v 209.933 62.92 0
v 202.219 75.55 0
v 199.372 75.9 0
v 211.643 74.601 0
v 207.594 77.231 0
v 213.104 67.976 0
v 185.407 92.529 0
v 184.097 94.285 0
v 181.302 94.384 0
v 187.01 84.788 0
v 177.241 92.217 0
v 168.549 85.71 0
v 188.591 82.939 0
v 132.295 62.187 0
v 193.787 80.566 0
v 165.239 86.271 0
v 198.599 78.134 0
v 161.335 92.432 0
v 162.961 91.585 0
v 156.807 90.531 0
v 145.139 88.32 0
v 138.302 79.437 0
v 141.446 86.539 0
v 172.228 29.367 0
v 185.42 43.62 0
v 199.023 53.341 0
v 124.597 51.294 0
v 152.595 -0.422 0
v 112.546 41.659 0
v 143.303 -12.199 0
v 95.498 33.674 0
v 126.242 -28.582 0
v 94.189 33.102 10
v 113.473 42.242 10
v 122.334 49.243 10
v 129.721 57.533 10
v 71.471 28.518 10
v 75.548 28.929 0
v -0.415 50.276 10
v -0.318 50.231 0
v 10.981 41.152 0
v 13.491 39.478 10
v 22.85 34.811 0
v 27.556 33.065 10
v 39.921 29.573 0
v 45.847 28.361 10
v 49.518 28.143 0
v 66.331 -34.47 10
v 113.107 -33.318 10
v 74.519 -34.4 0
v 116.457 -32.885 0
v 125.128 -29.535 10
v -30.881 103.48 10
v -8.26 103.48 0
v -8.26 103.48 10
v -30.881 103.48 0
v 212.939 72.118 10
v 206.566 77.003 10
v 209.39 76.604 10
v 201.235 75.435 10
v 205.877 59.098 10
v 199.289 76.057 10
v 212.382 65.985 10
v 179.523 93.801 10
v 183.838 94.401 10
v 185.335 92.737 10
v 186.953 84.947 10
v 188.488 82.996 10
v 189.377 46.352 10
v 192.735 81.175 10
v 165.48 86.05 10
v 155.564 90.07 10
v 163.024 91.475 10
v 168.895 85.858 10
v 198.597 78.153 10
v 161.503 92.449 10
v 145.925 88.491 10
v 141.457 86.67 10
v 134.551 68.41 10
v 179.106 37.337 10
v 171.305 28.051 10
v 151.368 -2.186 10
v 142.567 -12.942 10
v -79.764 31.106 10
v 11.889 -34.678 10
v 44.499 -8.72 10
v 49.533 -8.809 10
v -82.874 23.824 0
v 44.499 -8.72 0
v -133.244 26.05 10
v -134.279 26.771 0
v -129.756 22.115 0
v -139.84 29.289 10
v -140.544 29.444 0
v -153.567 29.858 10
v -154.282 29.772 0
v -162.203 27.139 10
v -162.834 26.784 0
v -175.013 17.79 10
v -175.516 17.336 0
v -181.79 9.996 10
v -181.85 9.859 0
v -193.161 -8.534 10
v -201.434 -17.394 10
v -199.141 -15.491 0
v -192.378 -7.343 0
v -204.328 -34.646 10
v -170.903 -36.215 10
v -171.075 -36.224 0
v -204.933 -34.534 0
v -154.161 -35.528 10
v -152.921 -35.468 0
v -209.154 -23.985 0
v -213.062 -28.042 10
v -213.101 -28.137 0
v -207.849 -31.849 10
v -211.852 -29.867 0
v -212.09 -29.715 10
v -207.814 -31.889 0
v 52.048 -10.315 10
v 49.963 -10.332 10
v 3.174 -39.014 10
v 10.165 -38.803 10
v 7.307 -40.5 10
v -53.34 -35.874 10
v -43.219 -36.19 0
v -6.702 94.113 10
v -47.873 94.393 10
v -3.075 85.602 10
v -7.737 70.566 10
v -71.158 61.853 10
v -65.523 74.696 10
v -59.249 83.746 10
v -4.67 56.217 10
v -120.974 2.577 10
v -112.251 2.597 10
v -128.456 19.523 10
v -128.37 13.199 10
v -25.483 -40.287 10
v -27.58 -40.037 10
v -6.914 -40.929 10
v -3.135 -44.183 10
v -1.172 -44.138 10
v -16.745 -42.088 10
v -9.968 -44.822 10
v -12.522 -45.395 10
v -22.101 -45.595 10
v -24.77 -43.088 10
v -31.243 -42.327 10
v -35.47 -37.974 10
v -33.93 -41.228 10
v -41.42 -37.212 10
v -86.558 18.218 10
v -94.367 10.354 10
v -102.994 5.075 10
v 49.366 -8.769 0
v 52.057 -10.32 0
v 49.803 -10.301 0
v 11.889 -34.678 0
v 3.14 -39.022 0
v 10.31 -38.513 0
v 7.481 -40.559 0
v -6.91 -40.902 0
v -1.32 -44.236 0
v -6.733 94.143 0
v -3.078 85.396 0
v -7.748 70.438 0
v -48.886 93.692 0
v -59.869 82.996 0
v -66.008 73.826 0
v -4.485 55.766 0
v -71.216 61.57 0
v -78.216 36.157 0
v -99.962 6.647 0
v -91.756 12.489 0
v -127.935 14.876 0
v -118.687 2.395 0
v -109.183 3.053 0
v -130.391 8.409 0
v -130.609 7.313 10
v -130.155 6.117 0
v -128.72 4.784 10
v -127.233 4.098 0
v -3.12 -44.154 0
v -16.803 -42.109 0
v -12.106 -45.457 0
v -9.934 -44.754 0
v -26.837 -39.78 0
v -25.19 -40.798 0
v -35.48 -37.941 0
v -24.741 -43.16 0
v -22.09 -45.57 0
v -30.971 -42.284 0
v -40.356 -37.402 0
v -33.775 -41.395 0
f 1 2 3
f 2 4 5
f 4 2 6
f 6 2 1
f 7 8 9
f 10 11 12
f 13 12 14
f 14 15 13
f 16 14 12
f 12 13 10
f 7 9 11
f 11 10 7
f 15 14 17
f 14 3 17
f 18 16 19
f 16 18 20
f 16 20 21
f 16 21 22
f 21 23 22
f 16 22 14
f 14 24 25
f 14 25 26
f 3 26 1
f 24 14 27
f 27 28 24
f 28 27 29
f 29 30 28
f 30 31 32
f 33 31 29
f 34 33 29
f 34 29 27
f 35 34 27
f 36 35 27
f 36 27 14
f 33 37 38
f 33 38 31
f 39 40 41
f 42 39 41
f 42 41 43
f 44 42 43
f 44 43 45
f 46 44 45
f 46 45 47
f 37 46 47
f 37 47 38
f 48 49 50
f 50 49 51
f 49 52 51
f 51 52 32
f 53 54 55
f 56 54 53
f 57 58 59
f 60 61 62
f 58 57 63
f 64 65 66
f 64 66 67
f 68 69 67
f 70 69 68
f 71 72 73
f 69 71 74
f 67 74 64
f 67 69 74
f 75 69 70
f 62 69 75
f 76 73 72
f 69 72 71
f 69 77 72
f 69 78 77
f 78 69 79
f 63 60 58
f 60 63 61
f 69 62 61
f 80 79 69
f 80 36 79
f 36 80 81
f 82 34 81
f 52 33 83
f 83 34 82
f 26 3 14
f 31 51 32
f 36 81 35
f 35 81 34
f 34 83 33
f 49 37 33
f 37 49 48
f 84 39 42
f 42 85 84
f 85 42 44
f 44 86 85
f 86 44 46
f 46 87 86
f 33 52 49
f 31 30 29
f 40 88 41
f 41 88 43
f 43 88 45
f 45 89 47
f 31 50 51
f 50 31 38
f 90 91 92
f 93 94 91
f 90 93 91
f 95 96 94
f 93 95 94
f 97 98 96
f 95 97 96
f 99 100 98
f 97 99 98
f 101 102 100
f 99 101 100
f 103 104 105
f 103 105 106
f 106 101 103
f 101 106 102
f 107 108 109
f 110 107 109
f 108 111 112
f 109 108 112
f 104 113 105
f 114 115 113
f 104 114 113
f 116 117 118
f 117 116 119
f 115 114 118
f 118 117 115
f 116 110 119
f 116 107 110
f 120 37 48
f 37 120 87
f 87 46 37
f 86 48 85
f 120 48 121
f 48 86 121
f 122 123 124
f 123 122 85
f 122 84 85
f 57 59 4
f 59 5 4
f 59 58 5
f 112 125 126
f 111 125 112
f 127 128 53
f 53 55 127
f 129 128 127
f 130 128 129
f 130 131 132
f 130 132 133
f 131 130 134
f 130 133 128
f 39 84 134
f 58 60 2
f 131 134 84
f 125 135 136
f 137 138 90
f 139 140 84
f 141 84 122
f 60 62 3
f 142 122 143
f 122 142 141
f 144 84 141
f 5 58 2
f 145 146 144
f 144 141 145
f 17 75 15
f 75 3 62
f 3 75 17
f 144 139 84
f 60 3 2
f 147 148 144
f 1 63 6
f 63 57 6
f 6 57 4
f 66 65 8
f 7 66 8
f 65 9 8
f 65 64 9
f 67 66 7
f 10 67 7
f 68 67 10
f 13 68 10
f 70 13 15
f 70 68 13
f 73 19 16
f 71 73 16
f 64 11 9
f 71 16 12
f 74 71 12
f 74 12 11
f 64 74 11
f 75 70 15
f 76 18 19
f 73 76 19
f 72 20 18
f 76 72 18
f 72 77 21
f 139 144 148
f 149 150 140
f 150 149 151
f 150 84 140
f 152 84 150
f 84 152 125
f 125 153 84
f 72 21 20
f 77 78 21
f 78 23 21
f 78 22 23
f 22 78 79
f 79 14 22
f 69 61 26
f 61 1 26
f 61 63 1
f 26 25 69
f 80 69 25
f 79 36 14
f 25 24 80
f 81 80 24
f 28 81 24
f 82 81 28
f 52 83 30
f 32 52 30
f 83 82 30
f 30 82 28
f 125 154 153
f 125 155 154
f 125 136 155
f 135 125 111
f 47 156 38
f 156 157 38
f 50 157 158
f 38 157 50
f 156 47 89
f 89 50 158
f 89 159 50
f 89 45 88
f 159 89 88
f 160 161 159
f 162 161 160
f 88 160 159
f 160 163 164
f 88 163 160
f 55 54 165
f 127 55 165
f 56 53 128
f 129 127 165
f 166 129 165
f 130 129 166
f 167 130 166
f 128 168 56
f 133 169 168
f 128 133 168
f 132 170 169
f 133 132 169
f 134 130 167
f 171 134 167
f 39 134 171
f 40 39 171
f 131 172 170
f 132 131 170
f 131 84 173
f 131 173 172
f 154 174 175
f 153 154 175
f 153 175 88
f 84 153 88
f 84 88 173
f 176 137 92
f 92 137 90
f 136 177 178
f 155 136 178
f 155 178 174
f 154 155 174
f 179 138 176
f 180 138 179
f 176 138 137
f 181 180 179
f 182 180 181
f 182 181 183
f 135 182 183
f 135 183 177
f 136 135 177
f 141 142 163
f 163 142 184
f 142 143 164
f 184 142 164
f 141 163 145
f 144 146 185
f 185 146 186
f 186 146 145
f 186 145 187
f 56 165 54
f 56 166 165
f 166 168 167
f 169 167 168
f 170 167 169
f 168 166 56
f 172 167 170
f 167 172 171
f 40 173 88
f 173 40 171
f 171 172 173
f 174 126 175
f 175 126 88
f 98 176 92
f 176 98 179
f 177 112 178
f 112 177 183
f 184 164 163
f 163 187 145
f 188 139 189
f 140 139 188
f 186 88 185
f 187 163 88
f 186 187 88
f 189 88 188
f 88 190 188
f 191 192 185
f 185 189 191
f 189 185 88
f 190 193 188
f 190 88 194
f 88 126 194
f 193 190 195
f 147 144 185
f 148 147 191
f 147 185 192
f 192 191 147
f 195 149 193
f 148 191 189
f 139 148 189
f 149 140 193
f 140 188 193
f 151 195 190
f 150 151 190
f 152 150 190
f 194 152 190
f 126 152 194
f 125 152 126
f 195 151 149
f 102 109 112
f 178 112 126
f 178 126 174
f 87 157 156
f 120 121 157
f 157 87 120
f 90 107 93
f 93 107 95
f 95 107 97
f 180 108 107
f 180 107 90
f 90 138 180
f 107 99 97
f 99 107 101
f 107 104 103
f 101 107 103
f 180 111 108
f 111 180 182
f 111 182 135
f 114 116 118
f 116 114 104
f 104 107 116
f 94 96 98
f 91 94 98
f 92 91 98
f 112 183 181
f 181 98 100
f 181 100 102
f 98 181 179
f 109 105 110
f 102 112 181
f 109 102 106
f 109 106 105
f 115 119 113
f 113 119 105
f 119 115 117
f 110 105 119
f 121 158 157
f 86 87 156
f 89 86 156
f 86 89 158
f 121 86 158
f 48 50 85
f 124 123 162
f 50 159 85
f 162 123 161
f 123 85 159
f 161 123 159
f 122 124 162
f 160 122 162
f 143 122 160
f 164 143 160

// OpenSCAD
module cliff_wave_L1(scale) {polyhedron(
 points=[[199.37167358398438,75.90013885498047,0],[202.21896362304688,75.55001068115234,0],[209.93312072753906,62.91959762573242,0],
[207.5940704345703,77.23053741455078,0],[211.64306640625,74.60130310058594,0],[202.21896362304688,75.55001068115234,0],
[213.1039581298828,67.97622680664062,0],[202.21896362304688,75.55001068115234,0],[211.64306640625,74.60130310058594,0],
[209.93312072753906,62.91959762573242,0],[202.21896362304688,75.55001068115234,0],[213.1039581298828,67.97622680664062,0],
[181.3023681640625,94.38363647460938,0],[184.09671020507812,94.28502655029297,0],[185.40660095214844,92.5289535522461,0],
[168.54913330078125,85.71012115478516,0],[177.24105834960938,92.21691131591797,0],[187.0101776123047,84.78828430175781,0],
[132.2948760986328,62.18728256225586,0],[168.54913330078125,85.71012115478516,0],[188.59071350097656,82.93917846679688,0],
[188.59071350097656,82.93917846679688,0],[193.78683471679688,80.5660629272461,0],[132.2948760986328,62.18728256225586,0],
[168.54913330078125,85.71012115478516,0],[132.2948760986328,62.18728256225586,0],[165.23886108398438,86.27050018310547,0],
[187.0101776123047,84.78828430175781,0],[188.59071350097656,82.93917846679688,0],[168.54913330078125,85.71012115478516,0],
[177.24105834960938,92.21691131591797,0],[181.3023681640625,94.38363647460938,0],[185.40660095214844,92.5289535522461,0],
[185.40660095214844,92.5289535522461,0],[187.0101776123047,84.78828430175781,0],[177.24105834960938,92.21691131591797,0],
[198.59877014160156,78.13407135009766,0],[132.2948760986328,62.18728256225586,0],[193.78683471679688,80.5660629272461,0],
[198.59877014160156,78.13407135009766,0],[199.37167358398438,75.90013885498047,0],[132.2948760986328,62.18728256225586,0],
[162.96141052246094,91.58535766601562,0],[165.23886108398438,86.27050018310547,0],[161.33468627929688,92.43206787109375,0],
[156.8072967529297,90.53131866455078,0],[161.33468627929688,92.43206787109375,0],[165.23886108398438,86.27050018310547,0],
[145.1394500732422,88.31961822509766,0],[156.8072967529297,90.53131866455078,0],[165.23886108398438,86.27050018310547,0],
[138.30226135253906,79.4373550415039,0],[145.1394500732422,88.31961822509766,0],[165.23886108398438,86.27050018310547,0],
[138.30226135253906,79.4373550415039,0],[141.44580078125,86.53934478759766,0],[145.1394500732422,88.31961822509766,0],
[132.2948760986328,62.18728256225586,0],[138.30226135253906,79.4373550415039,0],[165.23886108398438,86.27050018310547,0],
[185.42034912109375,43.62025833129883,0],[172.22792053222656,29.366931915283203,0],[132.2948760986328,62.18728256225586,0],
[199.02317810058594,53.34084701538086,0],[185.42034912109375,43.62025833129883,0],[132.2948760986328,62.18728256225586,0],
[209.93312072753906,62.91959762573242,0],[199.02317810058594,53.34084701538086,0],[199.37167358398438,75.90013885498047,0],
[124.59748077392578,51.29447555541992,0],[132.2948760986328,62.18728256225586,0],[172.22792053222656,29.366931915283203,0],
[172.22792053222656,29.366931915283203,0],[152.59469604492188,-0.42217034101486206,0],[124.59748077392578,51.29447555541992,0],
[112.54574584960938,41.65903854370117,0],[124.59748077392578,51.29447555541992,0],[152.59469604492188,-0.42217034101486206,0],
[152.59469604492188,-0.42217034101486206,0],[143.30255126953125,-12.19916820526123,0],[112.54574584960938,41.65903854370117,0],
[126.24242401123047,-28.581745147705078,0],[95.49767303466797,33.674278259277344,0],[143.30255126953125,-12.19916820526123,0],
[112.54574584960938,41.65903854370117,0],[95.49767303466797,33.674278259277344,0],[94.1887435913086,33.1020393371582,10],
[112.54574584960938,41.65903854370117,0],[94.1887435913086,33.1020393371582,10],[113.4732666015625,42.2421989440918,10],
[124.59748077392578,51.29447555541992,0],[112.54574584960938,41.65903854370117,0],[113.4732666015625,42.2421989440918,10],
[124.59748077392578,51.29447555541992,0],[113.4732666015625,42.2421989440918,10],[122.33402252197266,49.24305725097656,10],
[124.59748077392578,51.29447555541992,0],[122.33402252197266,49.24305725097656,10],[129.7212371826172,57.533226013183594,10],
[132.2948760986328,62.18728256225586,0],[124.59748077392578,51.29447555541992,0],[129.7212371826172,57.533226013183594,10],
[75.54798126220703,28.928678512573242,0],[71.4708480834961,28.517797470092773,10],[94.1887435913086,33.1020393371582,10],
[95.49767303466797,33.674278259277344,0],[75.54798126220703,28.928678512573242,0],[94.1887435913086,33.1020393371582,10],
[10.981195449829102,41.152252197265625,0],[-0.3182032108306885,50.23066329956055,0],[-0.4153667092323303,50.275516510009766,10],
[10.981195449829102,41.152252197265625,0],[-0.4153667092323303,50.275516510009766,10],[13.491422653198242,39.477725982666016,10],
[22.850000381469727,34.810760498046875,0],[10.981195449829102,41.152252197265625,0],[13.491422653198242,39.477725982666016,10],
[22.850000381469727,34.810760498046875,0],[13.491422653198242,39.477725982666016,10],[27.555904388427734,33.06477737426758,10],
[39.92094802856445,29.573442459106445,0],[22.850000381469727,34.810760498046875,0],[27.555904388427734,33.06477737426758,10],
[39.92094802856445,29.573442459106445,0],[27.555904388427734,33.06477737426758,10],[45.847076416015625,28.361417770385742,10],
[49.51791763305664,28.14299201965332,0],[39.92094802856445,29.573442459106445,0],[45.847076416015625,28.361417770385742,10],
[49.51791763305664,28.14299201965332,0],[45.847076416015625,28.361417770385742,10],[71.4708480834961,28.517797470092773,10],
[75.54798126220703,28.928678512573242,0],[49.51791763305664,28.14299201965332,0],[71.4708480834961,28.517797470092773,10],
[74.51927185058594,-34.40031051635742,0],[113.10662841796875,-33.31764221191406,10],[66.33106231689453,-34.47044372558594,10],
[116.45669555664062,-32.88462829589844,0],[113.10662841796875,-33.31764221191406,10],[74.51927185058594,-34.40031051635742,0],
[116.45669555664062,-32.88462829589844,0],[125.12801361083984,-29.535409927368164,10],[113.10662841796875,-33.31764221191406,10],
[126.24242401123047,-28.581745147705078,0],[125.12801361083984,-29.535409927368164,10],[116.45669555664062,-32.88462829589844,0],
[-8.260000228881836,103.4800033569336,10],[-8.260000228881836,103.4800033569336,0],[-30.881000518798828,103.4800033569336,10],
[-30.881000518798828,103.4800033569336,10],[-8.260000228881836,103.4800033569336,0],[-30.881000518798828,103.4800033569336,0],
[209.38973999023438,76.6042251586914,10],[206.56561279296875,77.00340270996094,10],[212.93914794921875,72.11756134033203,10],
[199.28900146484375,76.05670928955078,10],[205.87713623046875,59.09784698486328,10],[201.23477172851562,75.43526458740234,10],
[212.38209533691406,65.98548126220703,10],[212.93914794921875,72.11756134033203,10],[206.56561279296875,77.00340270996094,10],
[185.33534240722656,92.7367935180664,10],[183.83792114257812,94.40069580078125,10],[179.52325439453125,93.80120086669922,10],
[186.9530792236328,84.94690704345703,10],[185.33534240722656,92.7367935180664,10],[179.52325439453125,93.80120086669922,10],
[186.9530792236328,84.94690704345703,10],[189.37725830078125,46.35154342651367,10],[188.4876708984375,82.99583435058594,10],
[188.4876708984375,82.99583435058594,10],[189.37725830078125,46.35154342651367,10],[192.73458862304688,81.174560546875,10],
[163.02427673339844,91.47467803955078,10],[155.56365966796875,90.07017517089844,10],[165.48045349121094,86.05018615722656,10],
[168.8946533203125,85.85816955566406,10],[165.48045349121094,86.05018615722656,10],[189.37725830078125,46.35154342651367,10],
[179.52325439453125,93.80120086669922,10],[168.8946533203125,85.85816955566406,10],[186.9530792236328,84.94690704345703,10],
[168.8946533203125,85.85816955566406,10],[189.37725830078125,46.35154342651367,10],[186.9530792236328,84.94690704345703,10],
[192.73458862304688,81.174560546875,10],[189.37725830078125,46.35154342651367,10],[198.5966339111328,78.153076171875,10],
[198.5966339111328,78.153076171875,10],[189.37725830078125,46.35154342651367,10],[199.28900146484375,76.05670928955078,10],
[155.56365966796875,90.07017517089844,10],[163.02427673339844,91.47467803955078,10],[161.5028076171875,92.4485092163086,10],
[165.48045349121094,86.05018615722656,10],[155.56365966796875,90.07017517089844,10],[189.37725830078125,46.35154342651367,10],
[155.56365966796875,90.07017517089844,10],[145.92495727539062,88.49105072021484,10],[189.37725830078125,46.35154342651367,10],
[145.92495727539062,88.49105072021484,10],[141.45726013183594,86.66956329345703,10],[189.37725830078125,46.35154342651367,10],
[134.55137634277344,68.40991973876953,10],[189.37725830078125,46.35154342651367,10],[141.45726013183594,86.66956329345703,10],
[206.56561279296875,77.00340270996094,10],[201.23477172851562,75.43526458740234,10],[212.38209533691406,65.98548126220703,10],
[205.87713623046875,59.09784698486328,10],[212.38209533691406,65.98548126220703,10],[201.23477172851562,75.43526458740234,10],
[205.87713623046875,59.09784698486328,10],[199.28900146484375,76.05670928955078,10],[189.37725830078125,46.35154342651367,10],
[189.37725830078125,46.35154342651367,10],[134.55137634277344,68.40991973876953,10],[179.1058349609375,37.33666229248047,10],
[134.55137634277344,68.40991973876953,10],[129.7212371826172,57.533226013183594,10],[179.1058349609375,37.33666229248047,10],
[171.30477905273438,28.05082893371582,10],[179.1058349609375,37.33666229248047,10],[129.7212371826172,57.533226013183594,10],
[171.30477905273438,28.05082893371582,10],[113.4732666015625,42.2421989440918,10],[151.36825561523438,-2.185760974884033,10],
[142.56651306152344,-12.942140579223633,10],[94.1887435913086,33.1020393371582,10],[125.12801361083984,-29.535409927368164,10],
[151.36825561523438,-2.185760974884033,10],[113.4732666015625,42.2421989440918,10],[142.56651306152344,-12.942140579223633,10],
[132.2948760986328,62.18728256225586,0],[199.37167358398438,75.90013885498047,0],[199.02317810058594,53.34084701538086,0],
[126.24242401123047,-28.581745147705078,0],[116.45669555664062,-32.88462829589844,0],[95.49767303466797,33.674278259277344,0],
[122.33402252197266,49.24305725097656,10],[171.30477905273438,28.05082893371582,10],[129.7212371826172,57.533226013183594,10],
[113.4732666015625,42.2421989440918,10],[171.30477905273438,28.05082893371582,10],[122.33402252197266,49.24305725097656,10],
[94.1887435913086,33.1020393371582,10],[142.56651306152344,-12.942140579223633,10],[113.4732666015625,42.2421989440918,10],
[94.1887435913086,33.1020393371582,10],[71.4708480834961,28.517797470092773,10],[113.10662841796875,-33.31764221191406,10],
[66.33106231689453,-34.47044372558594,10],[113.10662841796875,-33.31764221191406,10],[71.4708480834961,28.517797470092773,10],
[13.491422653198242,39.477725982666016,10],[-0.4153667092323303,50.275516510009766,10],[-79.7637710571289,31.10643196105957,10],
[-79.7637710571289,31.10643196105957,10],[11.888999938964844,-34.678001403808594,10],[13.491422653198242,39.477725982666016,10],
[27.555904388427734,33.06477737426758,10],[13.491422653198242,39.477725982666016,10],[11.888999938964844,-34.678001403808594,10],
[11.888999938964844,-34.678001403808594,10],[44.499000549316406,-8.720000267028809,10],[27.555904388427734,33.06477737426758,10],
[45.847076416015625,28.361417770385742,10],[27.555904388427734,33.06477737426758,10],[44.499000549316406,-8.720000267028809,10],
[44.499000549316406,-8.720000267028809,10],[49.53274154663086,-8.809224128723145,10],[45.847076416015625,28.361417770385742,10],
[113.10662841796875,-33.31764221191406,10],[125.12801361083984,-29.535409927368164,10],[94.1887435913086,33.1020393371582,10],
[112.54574584960938,41.65903854370117,0],[143.30255126953125,-12.19916820526123,0],[95.49767303466797,33.674278259277344,0],
[10.981195449829102,41.152252197265625,0],[-82.87432098388672,23.8238582611084,0],[-0.3182032108306885,50.23066329956055,0],
[22.850000381469727,34.810760498046875,0],[-82.87432098388672,23.8238582611084,0],[10.981195449829102,41.152252197265625,0],
[39.92094802856445,29.573442459106445,0],[-82.87432098388672,23.8238582611084,0],[22.850000381469727,34.810760498046875,0],
[49.51791763305664,28.14299201965332,0],[44.499000549316406,-8.720000267028809,0],[39.92094802856445,29.573442459106445,0],
[116.45669555664062,-32.88462829589844,0],[74.51927185058594,-34.40031051635742,0],[95.49767303466797,33.674278259277344,0],
[75.54798126220703,28.928678512573242,0],[95.49767303466797,33.674278259277344,0],[74.51927185058594,-34.40031051635742,0],
[-129.7556915283203,22.115089416503906,0],[-134.27857971191406,26.770544052124023,0],[-133.2444610595703,26.04967498779297,10],
[-134.27857971191406,26.770544052124023,0],[-140.54364013671875,29.44390869140625,0],[-139.84039306640625,29.28890037536621,10],
[-134.27857971191406,26.770544052124023,0],[-139.84039306640625,29.28890037536621,10],[-133.2444610595703,26.04967498779297,10],
[-140.54364013671875,29.44390869140625,0],[-154.28233337402344,29.771726608276367,0],[-153.567138671875,29.858436584472656,10],
[-140.54364013671875,29.44390869140625,0],[-153.567138671875,29.858436584472656,10],[-139.84039306640625,29.28890037536621,10],
[-154.28233337402344,29.771726608276367,0],[-162.83412170410156,26.783966064453125,0],[-162.2031707763672,27.13936996459961,10],
[-154.28233337402344,29.771726608276367,0],[-162.2031707763672,27.13936996459961,10],[-153.567138671875,29.858436584472656,10],
[-162.83412170410156,26.783966064453125,0],[-175.51565551757812,17.33550262451172,0],[-175.01324462890625,17.790390014648438,10],
[-162.83412170410156,26.783966064453125,0],[-175.01324462890625,17.790390014648438,10],[-162.2031707763672,27.13936996459961,10],
[-175.51565551757812,17.33550262451172,0],[-181.8504180908203,9.858535766601562,0],[-181.78970336914062,9.995529174804688,10],
[-175.51565551757812,17.33550262451172,0],[-181.78970336914062,9.995529174804688,10],[-175.01324462890625,17.790390014648438,10],
[-199.14105224609375,-15.491259574890137,0],[-201.43392944335938,-17.39444923400879,10],[-193.16064453125,-8.533787727355957,10],
[-192.3775634765625,-7.343181133270264,0],[-199.14105224609375,-15.491259574890137,0],[-193.16064453125,-8.533787727355957,10],
[-193.16064453125,-8.533787727355957,10],[-181.78970336914062,9.995529174804688,10],[-192.3775634765625,-7.343181133270264,0],
[-181.8504180908203,9.858535766601562,0],[-192.3775634765625,-7.343181133270264,0],[-181.78970336914062,9.995529174804688,10],
[-171.0751953125,-36.22438049316406,0],[-170.90338134765625,-36.21523666381836,10],[-204.3284912109375,-34.645782470703125,10],
[-171.0751953125,-36.22438049316406,0],[-204.3284912109375,-34.645782470703125,10],[-204.9325714111328,-34.53371047973633,0],
[-152.92137145996094,-35.468204498291016,0],[-154.16140747070312,-35.52764892578125,10],[-170.90338134765625,-36.21523666381836,10],
[-152.92137145996094,-35.468204498291016,0],[-170.90338134765625,-36.21523666381836,10],[-171.0751953125,-36.22438049316406,0],
[-199.14105224609375,-15.491259574890137,0],[-209.1544952392578,-23.985443115234375,0],[-201.43392944335938,-17.39444923400879,10],
[-209.1544952392578,-23.985443115234375,0],[-213.1012725830078,-28.137075424194336,0],[-213.0622100830078,-28.042200088500977,10],
[-209.1544952392578,-23.985443115234375,0],[-213.0622100830078,-28.042200088500977,10],[-201.43392944335938,-17.39444923400879,10],
[-212.09007263183594,-29.714599609375,10],[-211.85186767578125,-29.86714744567871,0],[-207.84930419921875,-31.84939193725586,10],
[-207.81443786621094,-31.88942527770996,0],[-207.84930419921875,-31.84939193725586,10],[-211.85186767578125,-29.86714744567871,0],
[-212.09007263183594,-29.714599609375,10],[-213.0622100830078,-28.042200088500977,10],[-213.1012725830078,-28.137075424194336,0],
[-213.1012725830078,-28.137075424194336,0],[-211.85186767578125,-29.86714744567871,0],[-212.09007263183594,-29.714599609375,10],
[-207.81443786621094,-31.88942527770996,0],[-204.9325714111328,-34.53371047973633,0],[-207.84930419921875,-31.84939193725586,10],
[-204.9325714111328,-34.53371047973633,0],[-204.3284912109375,-34.645782470703125,10],[-207.84930419921875,-31.84939193725586,10],
[66.33106231689453,-34.47044372558594,10],[71.4708480834961,28.517797470092773,10],[52.048072814941406,-10.315421104431152,10],
[49.53274154663086,-8.809224128723145,10],[52.048072814941406,-10.315421104431152,10],[71.4708480834961,28.517797470092773,10],
[71.4708480834961,28.517797470092773,10],[45.847076416015625,28.361417770385742,10],[49.53274154663086,-8.809224128723145,10],
[11.888999938964844,-34.678001403808594,10],[66.33106231689453,-34.47044372558594,10],[44.499000549316406,-8.720000267028809,10],
[49.962650299072266,-10.331576347351074,10],[66.33106231689453,-34.47044372558594,10],[52.048072814941406,-10.315421104431152,10],
[49.962650299072266,-10.331576347351074,10],[44.499000549316406,-8.720000267028809,10],[66.33106231689453,-34.47044372558594,10],
[7.306832790374756,-40.499656677246094,10],[10.165343284606934,-38.80281066894531,10],[3.173877239227295,-39.01404571533203,10],
[11.888999938964844,-34.678001403808594,10],[3.173877239227295,-39.01404571533203,10],[10.165343284606934,-38.80281066894531,10],
[11.888999938964844,-34.678001403808594,10],[-79.7637710571289,31.10643196105957,10],[3.173877239227295,-39.01404571533203,10],
[211.64306640625,74.60130310058594,0],[209.38973999023438,76.6042251586914,10],[212.93914794921875,72.11756134033203,10],
[211.64306640625,74.60130310058594,0],[207.5940704345703,77.23053741455078,0],[209.38973999023438,76.6042251586914,10],
[207.5940704345703,77.23053741455078,0],[206.56561279296875,77.00340270996094,10],[209.38973999023438,76.6042251586914,10],
[-43.21868896484375,-36.18983459472656,0],[-53.33951187133789,-35.874061584472656,10],[-152.92137145996094,-35.468204498291016,0],
[-152.92137145996094,-35.468204498291016,0],[-53.33951187133789,-35.874061584472656,10],[-154.16140747070312,-35.52764892578125,10],
[-30.881000518798828,103.4800033569336,10],[-47.872615814208984,94.39278411865234,10],[-6.701964378356934,94.11285400390625,10],
[-6.701964378356934,94.11285400390625,10],[-8.260000228881836,103.4800033569336,10],[-30.881000518798828,103.4800033569336,10],
[-6.701964378356934,94.11285400390625,10],[-47.872615814208984,94.39278411865234,10],[-3.074937343597412,85.6019058227539,10],
[-3.074937343597412,85.6019058227539,10],[-47.872615814208984,94.39278411865234,10],[-7.737444877624512,70.5660629272461,10],
[-65.5233154296875,74.696044921875,10],[-71.158203125,61.85307693481445,10],[-7.737444877624512,70.5660629272461,10],
[-59.248958587646484,83.74592590332031,10],[-65.5233154296875,74.696044921875,10],[-7.737444877624512,70.5660629272461,10],
[-4.6702046394348145,56.216670989990234,10],[-7.737444877624512,70.5660629272461,10],[-71.158203125,61.85307693481445,10],
[-47.872615814208984,94.39278411865234,10],[-59.248958587646484,83.74592590332031,10],[-7.737444877624512,70.5660629272461,10],
[-4.6702046394348145,56.216670989990234,10],[-79.7637710571289,31.10643196105957,10],[-0.4153667092323303,50.275516510009766,10],
[202.21896362304688,75.55001068115234,0],[201.23477172851562,75.43526458740234,10],[206.56561279296875,77.00340270996094,10],
[-79.7637710571289,31.10643196105957,10],[-4.6702046394348145,56.216670989990234,10],[-71.158203125,61.85307693481445,10],
[-112.2509994506836,2.5969998836517334,10],[-120.97369384765625,2.577406167984009,10],[-53.33951187133789,-35.874061584472656,10],
[-133.2444610595703,26.04967498779297,10],[-128.36959838867188,13.199297904968262,10],[-128.45645141601562,19.52318572998047,10],
[-79.7637710571289,31.10643196105957,10],[-27.580223083496094,-40.037071228027344,10],[-25.483245849609375,-40.286685943603516,10],
[3.173877239227295,-39.01404571533203,10],[-79.7637710571289,31.10643196105957,10],[-6.914295196533203,-40.92919921875,10],
[199.37167358398438,75.90013885498047,0],[199.28900146484375,76.05670928955078,10],[201.23477172851562,75.43526458740234,10],
[-1.1721389293670654,-44.13786697387695,10],[3.173877239227295,-39.01404571533203,10],[-3.135453224182129,-44.18324279785156,10],
[-6.914295196533203,-40.92919921875,10],[-3.135453224182129,-44.18324279785156,10],[3.173877239227295,-39.01404571533203,10],
[-6.914295196533203,-40.92919921875,10],[-79.7637710571289,31.10643196105957,10],[-16.7452392578125,-42.088287353515625,10],
[202.21896362304688,75.55001068115234,0],[206.56561279296875,77.00340270996094,10],[207.5940704345703,77.23053741455078,0],
[-16.7452392578125,-42.088287353515625,10],[-12.522496223449707,-45.394588470458984,10],[-9.967960357666016,-44.82192611694336,10],
[-9.967960357666016,-44.82192611694336,10],[-6.914295196533203,-40.92919921875,10],[-16.7452392578125,-42.088287353515625,10],
[193.78683471679688,80.5660629272461,0],[198.5966339111328,78.153076171875,10],[198.59877014160156,78.13407135009766,0],
[199.28900146484375,76.05670928955078,10],[199.37167358398438,75.90013885498047,0],[198.5966339111328,78.153076171875,10],
[198.59877014160156,78.13407135009766,0],[198.5966339111328,78.153076171875,10],[199.37167358398438,75.90013885498047,0],
[-79.7637710571289,31.10643196105957,10],[-25.483245849609375,-40.286685943603516,10],[-16.7452392578125,-42.088287353515625,10],
[202.21896362304688,75.55001068115234,0],[199.37167358398438,75.90013885498047,0],[201.23477172851562,75.43526458740234,10],
[-16.7452392578125,-42.088287353515625,10],[-24.770307540893555,-43.088199615478516,10],[-22.10101318359375,-45.594539642333984,10],
[213.1039581298828,67.97622680664062,0],[212.38209533691406,65.98548126220703,10],[209.93312072753906,62.91959762573242,0],
[213.1039581298828,67.97622680664062,0],[212.93914794921875,72.11756134033203,10],[212.38209533691406,65.98548126220703,10],
[211.64306640625,74.60130310058594,0],[212.93914794921875,72.11756134033203,10],[213.1039581298828,67.97622680664062,0],
[184.09671020507812,94.28502655029297,0],[183.83792114257812,94.40069580078125,10],[185.33534240722656,92.7367935180664,10],
[184.09671020507812,94.28502655029297,0],[185.33534240722656,92.7367935180664,10],[185.40660095214844,92.5289535522461,0],
[184.09671020507812,94.28502655029297,0],[181.3023681640625,94.38363647460938,0],[183.83792114257812,94.40069580078125,10],
[181.3023681640625,94.38363647460938,0],[179.52325439453125,93.80120086669922,10],[183.83792114257812,94.40069580078125,10],
[185.40660095214844,92.5289535522461,0],[185.33534240722656,92.7367935180664,10],[186.9530792236328,84.94690704345703,10],
[185.40660095214844,92.5289535522461,0],[186.9530792236328,84.94690704345703,10],[187.0101776123047,84.78828430175781,0],
[187.0101776123047,84.78828430175781,0],[186.9530792236328,84.94690704345703,10],[188.4876708984375,82.99583435058594,10],
[187.0101776123047,84.78828430175781,0],[188.4876708984375,82.99583435058594,10],[188.59071350097656,82.93917846679688,0],
[193.78683471679688,80.5660629272461,0],[188.59071350097656,82.93917846679688,0],[192.73458862304688,81.174560546875,10],
[188.59071350097656,82.93917846679688,0],[188.4876708984375,82.99583435058594,10],[192.73458862304688,81.174560546875,10],
[165.23886108398438,86.27050018310547,0],[162.96141052246094,91.58535766601562,0],[163.02427673339844,91.47467803955078,10],
[165.23886108398438,86.27050018310547,0],[163.02427673339844,91.47467803955078,10],[165.48045349121094,86.05018615722656,10],
[181.3023681640625,94.38363647460938,0],[177.24105834960938,92.21691131591797,0],[179.52325439453125,93.80120086669922,10],
[168.54913330078125,85.71012115478516,0],[165.23886108398438,86.27050018310547,0],[165.48045349121094,86.05018615722656,10],
[168.54913330078125,85.71012115478516,0],[165.48045349121094,86.05018615722656,10],[168.8946533203125,85.85816955566406,10],
[177.24105834960938,92.21691131591797,0],[168.54913330078125,85.71012115478516,0],[168.8946533203125,85.85816955566406,10],
[177.24105834960938,92.21691131591797,0],[168.8946533203125,85.85816955566406,10],[179.52325439453125,93.80120086669922,10],
[193.78683471679688,80.5660629272461,0],[192.73458862304688,81.174560546875,10],[198.5966339111328,78.153076171875,10],
[162.96141052246094,91.58535766601562,0],[161.33468627929688,92.43206787109375,0],[161.5028076171875,92.4485092163086,10],
[162.96141052246094,91.58535766601562,0],[161.5028076171875,92.4485092163086,10],[163.02427673339844,91.47467803955078,10],
[161.33468627929688,92.43206787109375,0],[156.8072967529297,90.53131866455078,0],[155.56365966796875,90.07017517089844,10],
[161.33468627929688,92.43206787109375,0],[155.56365966796875,90.07017517089844,10],[161.5028076171875,92.4485092163086,10],
[145.1394500732422,88.31961822509766,0],[145.92495727539062,88.49105072021484,10],[155.56365966796875,90.07017517089844,10],
[-24.770307540893555,-43.088199615478516,10],[-16.7452392578125,-42.088287353515625,10],[-25.483245849609375,-40.286685943603516,10],
[-27.580223083496094,-40.037071228027344,10],[-35.47004699707031,-37.97396469116211,10],[-31.242631912231445,-42.32703399658203,10],
[-33.92977523803711,-41.22837448120117,10],[-31.242631912231445,-42.32703399658203,10],[-35.47004699707031,-37.97396469116211,10],
[-27.580223083496094,-40.037071228027344,10],[-79.7637710571289,31.10643196105957,10],[-35.47004699707031,-37.97396469116211,10],
[-35.47004699707031,-37.97396469116211,10],[-79.7637710571289,31.10643196105957,10],[-41.4198112487793,-37.21235656738281,10],
[-53.33951187133789,-35.874061584472656,10],[-41.4198112487793,-37.21235656738281,10],[-79.7637710571289,31.10643196105957,10],
[-79.7637710571289,31.10643196105957,10],[-86.5580825805664,18.218172073364258,10],[-53.33951187133789,-35.874061584472656,10],
[156.8072967529297,90.53131866455078,0],[145.1394500732422,88.31961822509766,0],[155.56365966796875,90.07017517089844,10],
[145.1394500732422,88.31961822509766,0],[141.45726013183594,86.66956329345703,10],[145.92495727539062,88.49105072021484,10],
[145.1394500732422,88.31961822509766,0],[141.44580078125,86.53934478759766,0],[141.45726013183594,86.66956329345703,10],
[141.44580078125,86.53934478759766,0],[138.30226135253906,79.4373550415039,0],[141.45726013183594,86.66956329345703,10],
[134.55137634277344,68.40991973876953,10],[141.45726013183594,86.66956329345703,10],[138.30226135253906,79.4373550415039,0],
[138.30226135253906,79.4373550415039,0],[132.2948760986328,62.18728256225586,0],[134.55137634277344,68.40991973876953,10],
[199.02317810058594,53.34084701538086,0],[205.87713623046875,59.09784698486328,10],[189.37725830078125,46.35154342651367,10],
[199.02317810058594,53.34084701538086,0],[209.93312072753906,62.91959762573242,0],[205.87713623046875,59.09784698486328,10],
[209.93312072753906,62.91959762573242,0],[212.38209533691406,65.98548126220703,10],[205.87713623046875,59.09784698486328,10],
[189.37725830078125,46.35154342651367,10],[185.42034912109375,43.62025833129883,0],[199.02317810058594,53.34084701538086,0],
[185.42034912109375,43.62025833129883,0],[189.37725830078125,46.35154342651367,10],[179.1058349609375,37.33666229248047,10],
[132.2948760986328,62.18728256225586,0],[129.7212371826172,57.533226013183594,10],[134.55137634277344,68.40991973876953,10],
[179.1058349609375,37.33666229248047,10],[172.22792053222656,29.366931915283203,0],[185.42034912109375,43.62025833129883,0],
[172.22792053222656,29.366931915283203,0],[179.1058349609375,37.33666229248047,10],[171.30477905273438,28.05082893371582,10],
[172.22792053222656,29.366931915283203,0],[171.30477905273438,28.05082893371582,10],[152.59469604492188,-0.42217034101486206,0],
[152.59469604492188,-0.42217034101486206,0],[171.30477905273438,28.05082893371582,10],[151.36825561523438,-2.185760974884033,10],
[143.30255126953125,-12.19916820526123,0],[142.56651306152344,-12.942140579223633,10],[125.12801361083984,-29.535409927368164,10],
[143.30255126953125,-12.19916820526123,0],[125.12801361083984,-29.535409927368164,10],[126.24242401123047,-28.581745147705078,0],
[143.30255126953125,-12.19916820526123,0],[151.36825561523438,-2.185760974884033,10],[142.56651306152344,-12.942140579223633,10],
[152.59469604492188,-0.42217034101486206,0],[151.36825561523438,-2.185760974884033,10],[143.30255126953125,-12.19916820526123,0],
[-86.5580825805664,18.218172073364258,10],[-94.36699676513672,10.354000091552734,10],[-53.33951187133789,-35.874061584472656,10],
[-94.36699676513672,10.354000091552734,10],[-102.994140625,5.075331211090088,10],[-53.33951187133789,-35.874061584472656,10],
[-102.994140625,5.075331211090088,10],[-112.2509994506836,2.5969998836517334,10],[-53.33951187133789,-35.874061584472656,10],
[-154.16140747070312,-35.52764892578125,10],[-53.33951187133789,-35.874061584472656,10],[-120.97369384765625,2.577406167984009,10],
[75.54798126220703,28.928678512573242,0],[49.36561584472656,-8.76927375793457,0],[49.51791763305664,28.14299201965332,0],
[75.54798126220703,28.928678512573242,0],[52.056949615478516,-10.32032585144043,0],[49.36561584472656,-8.76927375793457,0],
[49.80349349975586,-10.301359176635742,0],[52.056949615478516,-10.32032585144043,0],[74.51927185058594,-34.40031051635742,0],
[74.51927185058594,-34.40031051635742,0],[52.056949615478516,-10.32032585144043,0],[75.54798126220703,28.928678512573242,0],
[44.499000549316406,-8.720000267028809,0],[49.51791763305664,28.14299201965332,0],[49.36561584472656,-8.76927375793457,0],
[49.80349349975586,-10.301359176635742,0],[74.51927185058594,-34.40031051635742,0],[44.499000549316406,-8.720000267028809,0],
[74.51927185058594,-34.40031051635742,0],[11.888999938964844,-34.678001403808594,0],[44.499000549316406,-8.720000267028809,0],
[-82.87432098388672,23.8238582611084,0],[39.92094802856445,29.573442459106445,0],[44.499000549316406,-8.720000267028809,0],
[-82.87432098388672,23.8238582611084,0],[44.499000549316406,-8.720000267028809,0],[11.888999938964844,-34.678001403808594,0],
[11.888999938964844,-34.678001403808594,0],[10.309722900390625,-38.512943267822266,0],[3.1396639347076416,-39.02231216430664,0],
[3.1396639347076416,-39.02231216430664,0],[10.309722900390625,-38.512943267822266,0],[7.481036186218262,-40.55931091308594,0],
[11.888999938964844,-34.678001403808594,0],[3.1396639347076416,-39.02231216430664,0],[-82.87432098388672,23.8238582611084,0],
[-1.3202555179595947,-44.23619842529297,0],[-6.910058498382568,-40.90201950073242,0],[3.1396639347076416,-39.02231216430664,0],
[3.1396639347076416,-39.02231216430664,0],[-6.910058498382568,-40.90201950073242,0],[-82.87432098388672,23.8238582611084,0],
[-6.732726097106934,94.14342498779297,0],[-8.260000228881836,103.4800033569336,0],[-8.260000228881836,103.4800033569336,10],
[-6.732726097106934,94.14342498779297,0],[-8.260000228881836,103.4800033569336,10],[-6.701964378356934,94.11285400390625,10],
[-47.872615814208984,94.39278411865234,10],[-30.881000518798828,103.4800033569336,10],[-30.881000518798828,103.4800033569336,0],
[-6.732726097106934,94.14342498779297,0],[-6.701964378356934,94.11285400390625,10],[-3.074937343597412,85.6019058227539,10],
[-6.732726097106934,94.14342498779297,0],[-3.074937343597412,85.6019058227539,10],[-3.0780553817749023,85.39581298828125,0],
[-3.0780553817749023,85.39581298828125,0],[-3.074937343597412,85.6019058227539,10],[-7.737444877624512,70.5660629272461,10],
[-3.0780553817749023,85.39581298828125,0],[-7.737444877624512,70.5660629272461,10],[-7.748112201690674,70.4377670288086,0],
[-30.881000518798828,103.4800033569336,0],[-48.8859977722168,93.69190979003906,0],[-47.872615814208984,94.39278411865234,10],
[-48.8859977722168,93.69190979003906,0],[-59.868553161621094,82.99637603759766,0],[-59.248958587646484,83.74592590332031,10],
[-48.8859977722168,93.69190979003906,0],[-59.248958587646484,83.74592590332031,10],[-47.872615814208984,94.39278411865234,10],
[-59.868553161621094,82.99637603759766,0],[-66.00833129882812,73.82632446289062,0],[-65.5233154296875,74.696044921875,10],
[-59.868553161621094,82.99637603759766,0],[-65.5233154296875,74.696044921875,10],[-59.248958587646484,83.74592590332031,10],
[-7.748112201690674,70.4377670288086,0],[-7.737444877624512,70.5660629272461,10],[-4.6702046394348145,56.216670989990234,10],
[-7.748112201690674,70.4377670288086,0],[-4.6702046394348145,56.216670989990234,10],[-4.485143184661865,55.76621627807617,0],
[-4.485143184661865,55.76621627807617,0],[-4.6702046394348145,56.216670989990234,10],[-0.4153667092323303,50.275516510009766,10],
[-4.485143184661865,55.76621627807617,0],[-0.4153667092323303,50.275516510009766,10],[-0.3182032108306885,50.23066329956055,0],
[-66.00833129882812,73.82632446289062,0],[-71.2157211303711,61.57032012939453,0],[-71.158203125,61.85307693481445,10],
[-66.00833129882812,73.82632446289062,0],[-71.158203125,61.85307693481445,10],[-65.5233154296875,74.696044921875,10],
[-78.2162094116211,36.1574821472168,0],[-79.7637710571289,31.10643196105957,10],[-71.158203125,61.85307693481445,10],
[-71.2157211303711,61.57032012939453,0],[-78.2162094116211,36.1574821472168,0],[-71.158203125,61.85307693481445,10],
[-91.75608825683594,12.488960266113281,0],[-99.96199798583984,6.646999835968018,0],[-94.36699676513672,10.354000091552734,10],
[-91.75608825683594,12.488960266113281,0],[-94.36699676513672,10.354000091552734,10],[-86.5580825805664,18.218172073364258,10],
[-82.87432098388672,23.8238582611084,0],[-91.75608825683594,12.488960266113281,0],[-86.5580825805664,18.218172073364258,10],
[-82.87432098388672,23.8238582611084,0],[-86.5580825805664,18.218172073364258,10],[-79.7637710571289,31.10643196105957,10],
[-78.2162094116211,36.1574821472168,0],[-82.87432098388672,23.8238582611084,0],[-79.7637710571289,31.10643196105957,10],
[-129.7556915283203,22.115089416503906,0],[-128.45645141601562,19.52318572998047,10],[-127.93460083007812,14.87568473815918,0],
[-133.2444610595703,26.04967498779297,10],[-128.45645141601562,19.52318572998047,10],[-129.7556915283203,22.115089416503906,0],
[-109.18265533447266,3.0529377460479736,0],[-118.68699645996094,2.3949999809265137,0],[-112.2509994506836,2.5969998836517334,10],
[-109.18265533447266,3.0529377460479736,0],[-112.2509994506836,2.5969998836517334,10],[-102.994140625,5.075331211090088,10],
[-99.96199798583984,6.646999835968018,0],[-109.18265533447266,3.0529377460479736,0],[-102.994140625,5.075331211090088,10],
[-99.96199798583984,6.646999835968018,0],[-102.994140625,5.075331211090088,10],[-94.36699676513672,10.354000091552734,10],
[-127.93460083007812,14.87568473815918,0],[-128.36959838867188,13.199297904968262,10],[-130.39068603515625,8.408939361572266,0],
[-130.39068603515625,8.408939361572266,0],[-128.36959838867188,13.199297904968262,10],[-130.60891723632812,7.312777519226074,10],
[-128.45645141601562,19.52318572998047,10],[-128.36959838867188,13.199297904968262,10],[-127.93460083007812,14.87568473815918,0],
[-130.39068603515625,8.408939361572266,0],[-130.60891723632812,7.312777519226074,10],[-130.15463256835938,6.1173176765441895,0],
[-130.15463256835938,6.1173176765441895,0],[-130.60891723632812,7.312777519226074,10],[-128.7202911376953,4.784153938293457,10],
[-127.23291778564453,4.098145961761475,0],[-130.15463256835938,6.1173176765441895,0],[-128.7202911376953,4.784153938293457,10],
[-127.23291778564453,4.098145961761475,0],[-128.7202911376953,4.784153938293457,10],[-120.97369384765625,2.577406167984009,10],
[-118.68699645996094,2.3949999809265137,0],[-127.23291778564453,4.098145961761475,0],[-120.97369384765625,2.577406167984009,10],
[-118.68699645996094,2.3949999809265137,0],[-120.97369384765625,2.577406167984009,10],[-112.2509994506836,2.5969998836517334,10],
[-6.910058498382568,-40.90201950073242,0],[-3.135453224182129,-44.18324279785156,10],[-6.914295196533203,-40.92919921875,10],
[-3.1204490661621094,-44.15435791015625,0],[-3.135453224182129,-44.18324279785156,10],[-6.910058498382568,-40.90201950073242,0],
[-1.3202555179595947,-44.23619842529297,0],[-1.1721389293670654,-44.13786697387695,10],[-3.135453224182129,-44.18324279785156,10],
[-1.3202555179595947,-44.23619842529297,0],[-3.135453224182129,-44.18324279785156,10],[-3.1204490661621094,-44.15435791015625,0],
[-9.967960357666016,-44.82192611694336,10],[-6.910058498382568,-40.90201950073242,0],[-6.914295196533203,-40.92919921875,10],
[-16.802860260009766,-42.10857391357422,0],[-12.522496223449707,-45.394588470458984,10],[-16.7452392578125,-42.088287353515625,10],
[-12.106162071228027,-45.45663833618164,0],[-12.522496223449707,-45.394588470458984,10],[-16.802860260009766,-42.10857391357422,0],
[-9.967960357666016,-44.82192611694336,10],[-12.522496223449707,-45.394588470458984,10],[-12.106162071228027,-45.45663833618164,0],
[-9.933637619018555,-44.75432586669922,0],[-9.967960357666016,-44.82192611694336,10],[-12.106162071228027,-45.45663833618164,0],
[-8.260000228881836,103.4800033569336,0],[-6.732726097106934,94.14342498779297,0],[-30.881000518798828,103.4800033569336,0],
[-6.732726097106934,94.14342498779297,0],[-3.0780553817749023,85.39581298828125,0],[-30.881000518798828,103.4800033569336,0],
[-7.748112201690674,70.4377670288086,0],[-48.8859977722168,93.69190979003906,0],[-3.0780553817749023,85.39581298828125,0],
[-48.8859977722168,93.69190979003906,0],[-7.748112201690674,70.4377670288086,0],[-59.868553161621094,82.99637603759766,0],
[-59.868553161621094,82.99637603759766,0],[-7.748112201690674,70.4377670288086,0],[-66.00833129882812,73.82632446289062,0],
[-30.881000518798828,103.4800033569336,0],[-3.0780553817749023,85.39581298828125,0],[-48.8859977722168,93.69190979003906,0],
[-66.00833129882812,73.82632446289062,0],[-7.748112201690674,70.4377670288086,0],[-71.2157211303711,61.57032012939453,0],
[-4.485143184661865,55.76621627807617,0],[-71.2157211303711,61.57032012939453,0],[-7.748112201690674,70.4377670288086,0],
[-82.87432098388672,23.8238582611084,0],[-78.2162094116211,36.1574821472168,0],[-0.3182032108306885,50.23066329956055,0],
[-4.485143184661865,55.76621627807617,0],[-0.3182032108306885,50.23066329956055,0],[-78.2162094116211,36.1574821472168,0],
[-78.2162094116211,36.1574821472168,0],[-71.2157211303711,61.57032012939453,0],[-4.485143184661865,55.76621627807617,0],
[-91.75608825683594,12.488960266113281,0],[-43.21868896484375,-36.18983459472656,0],[-99.96199798583984,6.646999835968018,0],
[-82.87432098388672,23.8238582611084,0],[-43.21868896484375,-36.18983459472656,0],[-91.75608825683594,12.488960266113281,0],
[-129.7556915283203,22.115089416503906,0],[-127.93460083007812,14.87568473815918,0],[-162.83412170410156,26.783966064453125,0],
[-130.39068603515625,8.408939361572266,0],[-162.83412170410156,26.783966064453125,0],[-127.93460083007812,14.87568473815918,0],
[-109.18265533447266,3.0529377460479736,0],[-152.92137145996094,-35.468204498291016,0],[-118.68699645996094,2.3949999809265137,0],
[-127.23291778564453,4.098145961761475,0],[-118.68699645996094,2.3949999809265137,0],[-152.92137145996094,-35.468204498291016,0],
[-6.910058498382568,-40.90201950073242,0],[-1.3202555179595947,-44.23619842529297,0],[-3.1204490661621094,-44.15435791015625,0],
[-9.967960357666016,-44.82192611694336,10],[-9.933637619018555,-44.75432586669922,0],[-6.910058498382568,-40.90201950073242,0],
[-25.190332412719727,-40.7976188659668,0],[-25.483245849609375,-40.286685943603516,10],[-26.836881637573242,-39.77979278564453,0],
[-26.836881637573242,-39.77979278564453,0],[-25.483245849609375,-40.286685943603516,10],[-27.580223083496094,-40.037071228027344,10],
[-16.802860260009766,-42.10857391357422,0],[-82.87432098388672,23.8238582611084,0],[-12.106162071228027,-45.45663833618164,0],
[-82.87432098388672,23.8238582611084,0],[-6.910058498382568,-40.90201950073242,0],[-9.933637619018555,-44.75432586669922,0],
[-82.87432098388672,23.8238582611084,0],[-9.933637619018555,-44.75432586669922,0],[-12.106162071228027,-45.45663833618164,0],
[-26.836881637573242,-39.77979278564453,0],[-82.87432098388672,23.8238582611084,0],[-25.190332412719727,-40.7976188659668,0],
[-26.836881637573242,-39.77979278564453,0],[-35.47990036010742,-37.94115447998047,0],[-82.87432098388672,23.8238582611084,0],
[-16.802860260009766,-42.10857391357422,0],[-22.089555740356445,-45.56987762451172,0],[-24.740772247314453,-43.16035461425781,0],
[-24.740772247314453,-43.16035461425781,0],[-25.190332412719727,-40.7976188659668,0],[-16.802860260009766,-42.10857391357422,0],
[-82.87432098388672,23.8238582611084,0],[-16.802860260009766,-42.10857391357422,0],[-25.190332412719727,-40.7976188659668,0],
[-26.836881637573242,-39.77979278564453,0],[-30.970531463623047,-42.28350830078125,0],[-35.47990036010742,-37.94115447998047,0],
[-40.356285095214844,-37.40169906616211,0],[-82.87432098388672,23.8238582611084,0],[-35.47990036010742,-37.94115447998047,0],
[-40.356285095214844,-37.40169906616211,0],[-43.21868896484375,-36.18983459472656,0],[-82.87432098388672,23.8238582611084,0],
[-33.775108337402344,-41.39454650878906,0],[-35.47990036010742,-37.94115447998047,0],[-30.970531463623047,-42.28350830078125,0],
[-16.802860260009766,-42.10857391357422,0],[-16.7452392578125,-42.088287353515625,10],[-22.10101318359375,-45.594539642333984,10],
[-24.740772247314453,-43.16035461425781,0],[-22.10101318359375,-45.594539642333984,10],[-24.770307540893555,-43.088199615478516,10],
[-22.089555740356445,-45.56987762451172,0],[-16.802860260009766,-42.10857391357422,0],[-22.10101318359375,-45.594539642333984,10],
[-22.10101318359375,-45.594539642333984,10],[-24.740772247314453,-43.16035461425781,0],[-22.089555740356445,-45.56987762451172,0],
[-30.970531463623047,-42.28350830078125,0],[-31.242631912231445,-42.32703399658203,10],[-33.775108337402344,-41.39454650878906,0],
[-25.190332412719727,-40.7976188659668,0],[-24.740772247314453,-43.16035461425781,0],[-24.770307540893555,-43.088199615478516,10],
[-25.190332412719727,-40.7976188659668,0],[-24.770307540893555,-43.088199615478516,10],[-25.483245849609375,-40.286685943603516,10],
[-30.970531463623047,-42.28350830078125,0],[-27.580223083496094,-40.037071228027344,10],[-31.242631912231445,-42.32703399658203,10],
[-30.970531463623047,-42.28350830078125,0],[-26.836881637573242,-39.77979278564453,0],[-27.580223083496094,-40.037071228027344,10],
[-35.47990036010742,-37.94115447998047,0],[-33.775108337402344,-41.39454650878906,0],[-33.92977523803711,-41.22837448120117,10],
[-35.47990036010742,-37.94115447998047,0],[-33.92977523803711,-41.22837448120117,10],[-35.47004699707031,-37.97396469116211,10],
[-35.47990036010742,-37.94115447998047,0],[-35.47004699707031,-37.97396469116211,10],[-41.4198112487793,-37.21235656738281,10],
[-35.47990036010742,-37.94115447998047,0],[-41.4198112487793,-37.21235656738281,10],[-40.356285095214844,-37.40169906616211,0],
[-40.356285095214844,-37.40169906616211,0],[-41.4198112487793,-37.21235656738281,10],[-43.21868896484375,-36.18983459472656,0],
[-43.21868896484375,-36.18983459472656,0],[-41.4198112487793,-37.21235656738281,10],[-53.33951187133789,-35.874061584472656,10],
[-31.242631912231445,-42.32703399658203,10],[-33.92977523803711,-41.22837448120117,10],[-33.775108337402344,-41.39454650878906,0],
[-152.92137145996094,-35.468204498291016,0],[-171.0751953125,-36.22438049316406,0],[-181.8504180908203,9.858535766601562,0],
[-43.21868896484375,-36.18983459472656,0],[-152.92137145996094,-35.468204498291016,0],[-109.18265533447266,3.0529377460479736,0],
[-99.96199798583984,6.646999835968018,0],[-43.21868896484375,-36.18983459472656,0],[-109.18265533447266,3.0529377460479736,0],
[49.36561584472656,-8.76927375793457,0],[52.056949615478516,-10.32032585144043,0],[49.53274154663086,-8.809224128723145,10],
[52.056949615478516,-10.32032585144043,0],[49.962650299072266,-10.331576347351074,10],[52.048072814941406,-10.315421104431152,10],
[52.048072814941406,-10.315421104431152,10],[49.53274154663086,-8.809224128723145,10],[52.056949615478516,-10.32032585144043,0],
[-139.84039306640625,29.28890037536621,10],[-204.3284912109375,-34.645782470703125,10],[-133.2444610595703,26.04967498779297,10],
[-153.567138671875,29.858436584472656,10],[-204.3284912109375,-34.645782470703125,10],[-139.84039306640625,29.28890037536621,10],
[-162.2031707763672,27.13936996459961,10],[-204.3284912109375,-34.645782470703125,10],[-153.567138671875,29.858436584472656,10],
[-204.3284912109375,-34.645782470703125,10],[-170.90338134765625,-36.21523666381836,10],[-130.60891723632812,7.312777519226074,10],
[-133.2444610595703,26.04967498779297,10],[-204.3284912109375,-34.645782470703125,10],[-130.60891723632812,7.312777519226074,10],
[-130.60891723632812,7.312777519226074,10],[-128.36959838867188,13.199297904968262,10],[-133.2444610595703,26.04967498779297,10],
[-162.2031707763672,27.13936996459961,10],[-175.01324462890625,17.790390014648438,10],[-204.3284912109375,-34.645782470703125,10],
[-181.78970336914062,9.995529174804688,10],[-204.3284912109375,-34.645782470703125,10],[-175.01324462890625,17.790390014648438,10],
[-193.16064453125,-8.533787727355957,10],[-201.43392944335938,-17.39444923400879,10],[-204.3284912109375,-34.645782470703125,10],
[-193.16064453125,-8.533787727355957,10],[-204.3284912109375,-34.645782470703125,10],[-181.78970336914062,9.995529174804688,10],
[-170.90338134765625,-36.21523666381836,10],[-154.16140747070312,-35.52764892578125,10],[-130.60891723632812,7.312777519226074,10],
[-128.7202911376953,4.784153938293457,10],[-130.60891723632812,7.312777519226074,10],[-154.16140747070312,-35.52764892578125,10],
[-120.97369384765625,2.577406167984009,10],[-128.7202911376953,4.784153938293457,10],[-154.16140747070312,-35.52764892578125,10],
[-212.09007263183594,-29.714599609375,10],[-207.84930419921875,-31.84939193725586,10],[-213.0622100830078,-28.042200088500977,10],
[-201.43392944335938,-17.39444923400879,10],[-213.0622100830078,-28.042200088500977,10],[-207.84930419921875,-31.84939193725586,10],
[-207.84930419921875,-31.84939193725586,10],[-204.3284912109375,-34.645782470703125,10],[-201.43392944335938,-17.39444923400879,10],
[-162.83412170410156,26.783966064453125,0],[-154.28233337402344,29.771726608276367,0],[-140.54364013671875,29.44390869140625,0],
[-162.83412170410156,26.783966064453125,0],[-140.54364013671875,29.44390869140625,0],[-134.27857971191406,26.770544052124023,0],
[-162.83412170410156,26.783966064453125,0],[-134.27857971191406,26.770544052124023,0],[-129.7556915283203,22.115089416503906,0],
[-130.15463256835938,6.1173176765441895,0],[-127.23291778564453,4.098145961761475,0],[-152.92137145996094,-35.468204498291016,0],
[-175.51565551757812,17.33550262451172,0],[-162.83412170410156,26.783966064453125,0],[-130.15463256835938,6.1173176765441895,0],
[-181.8504180908203,9.858535766601562,0],[-175.51565551757812,17.33550262451172,0],[-130.15463256835938,6.1173176765441895,0],
[-130.39068603515625,8.408939361572266,0],[-130.15463256835938,6.1173176765441895,0],[-162.83412170410156,26.783966064453125,0],
[-204.9325714111328,-34.53371047973633,0],[-199.14105224609375,-15.491259574890137,0],[-171.0751953125,-36.22438049316406,0],
[-130.15463256835938,6.1173176765441895,0],[-152.92137145996094,-35.468204498291016,0],[-181.8504180908203,9.858535766601562,0],
[-192.3775634765625,-7.343181133270264,0],[-181.8504180908203,9.858535766601562,0],[-171.0751953125,-36.22438049316406,0],
[-199.14105224609375,-15.491259574890137,0],[-192.3775634765625,-7.343181133270264,0],[-171.0751953125,-36.22438049316406,0],
[-209.1544952392578,-23.985443115234375,0],[-207.81443786621094,-31.88942527770996,0],[-213.1012725830078,-28.137075424194336,0],
[-199.14105224609375,-15.491259574890137,0],[-207.81443786621094,-31.88942527770996,0],[-209.1544952392578,-23.985443115234375,0],
[-211.85186767578125,-29.86714744567871,0],[-213.1012725830078,-28.137075424194336,0],[-207.81443786621094,-31.88942527770996,0],
[-207.81443786621094,-31.88942527770996,0],[-199.14105224609375,-15.491259574890137,0],[-204.9325714111328,-34.53371047973633,0],
[52.056949615478516,-10.32032585144043,0],[49.80349349975586,-10.301359176635742,0],[49.962650299072266,-10.331576347351074,10],
[49.36561584472656,-8.76927375793457,0],[49.53274154663086,-8.809224128723145,10],[44.499000549316406,-8.720000267028809,10],
[49.36561584472656,-8.76927375793457,0],[44.499000549316406,-8.720000267028809,10],[44.499000549316406,-8.720000267028809,0],
[49.80349349975586,-10.301359176635742,0],[44.499000549316406,-8.720000267028809,0],[44.499000549316406,-8.720000267028809,10],
[49.80349349975586,-10.301359176635742,0],[44.499000549316406,-8.720000267028809,10],[49.962650299072266,-10.331576347351074,10],
[11.888999938964844,-34.678001403808594,10],[74.51927185058594,-34.40031051635742,0],[66.33106231689453,-34.47044372558594,10],
[7.481036186218262,-40.55931091308594,0],[10.165343284606934,-38.80281066894531,10],[7.306832790374756,-40.499656677246094,10],
[11.888999938964844,-34.678001403808594,10],[11.888999938964844,-34.678001403808594,0],[74.51927185058594,-34.40031051635742,0],
[10.309722900390625,-38.512943267822266,0],[10.165343284606934,-38.80281066894531,10],[7.481036186218262,-40.55931091308594,0],
[11.888999938964844,-34.678001403808594,0],[11.888999938964844,-34.678001403808594,10],[10.165343284606934,-38.80281066894531,10],
[11.888999938964844,-34.678001403808594,0],[10.165343284606934,-38.80281066894531,10],[10.309722900390625,-38.512943267822266,0],
[7.481036186218262,-40.55931091308594,0],[7.306832790374756,-40.499656677246094,10],[3.173877239227295,-39.01404571533203,10],
[7.481036186218262,-40.55931091308594,0],[3.173877239227295,-39.01404571533203,10],[3.1396639347076416,-39.02231216430664,0],
[3.1396639347076416,-39.02231216430664,0],[3.173877239227295,-39.01404571533203,10],[-1.1721389293670654,-44.13786697387695,10],
[3.1396639347076416,-39.02231216430664,0],[-1.1721389293670654,-44.13786697387695,10],[-1.3202555179595947,-44.23619842529297,0] ],
faces=[[0,1,2],[3,4,5],[6,7,8],
[9,10,11],[12,13,14],[15,16,17],
[18,19,20],[21,22,23],[24,25,26],
[27,28,29],[30,31,32],[33,34,35],
[36,37,38],[39,40,41],[42,43,44],
[45,46,47],[48,49,50],[51,52,53],
[54,55,56],[57,58,59],[60,61,62],
[63,64,65],[66,67,68],[69,70,71],
[72,73,74],[75,76,77],[78,79,80],
[81,82,83],[84,85,86],[87,88,89],
[90,91,92],[93,94,95],[96,97,98],
[99,100,101],[102,103,104],[105,106,107],
[108,109,110],[111,112,113],[114,115,116],
[117,118,119],[120,121,122],[123,124,125],
[126,127,128],[129,130,131],[132,133,134],
[135,136,137],[138,139,140],[141,142,143],
[144,145,146],[147,148,149],[150,151,152],
[153,154,155],[156,157,158],[159,160,161],
[162,163,164],[165,166,167],[168,169,170],
[171,172,173],[174,175,176],[177,178,179],
[180,181,182],[183,184,185],[186,187,188],
[189,190,191],[192,193,194],[195,196,197],
[198,199,200],[201,202,203],[204,205,206],
[207,208,209],[210,211,212],[213,214,215],
[216,217,218],[219,220,221],[222,223,224],
[225,226,227],[228,229,230],[231,232,233],
[234,235,236],[237,238,239],[240,241,242],
[243,244,245],[246,247,248],[249,250,251],
[252,253,254],[255,256,257],[258,259,260],
[261,262,263],[264,265,266],[267,268,269],
[270,271,272],[273,274,275],[276,277,278],
[279,280,281],[282,283,284],[285,286,287],
[288,289,290],[291,292,293],[294,295,296],
[297,298,299],[300,301,302],[303,304,305],
[306,307,308],[309,310,311],[312,313,314],
[315,316,317],[318,319,320],[321,322,323],
[324,325,326],[327,328,329],[330,331,332],
[333,334,335],[336,337,338],[339,340,341],
[342,343,344],[345,346,347],[348,349,350],
[351,352,353],[354,355,356],[357,358,359],
[360,361,362],[363,364,365],[366,367,368],
[369,370,371],[372,373,374],[375,376,377],
[378,379,380],[381,382,383],[384,385,386],
[387,388,389],[390,391,392],[393,394,395],
[396,397,398],[399,400,401],[402,403,404],
[405,406,407],[408,409,410],[411,412,413],
[414,415,416],[417,418,419],[420,421,422],
[423,424,425],[426,427,428],[429,430,431],
[432,433,434],[435,436,437],[438,439,440],
[441,442,443],[444,445,446],[447,448,449],
[450,451,452],[453,454,455],[456,457,458],
[459,460,461],[462,463,464],[465,466,467],
[468,469,470],[471,472,473],[474,475,476],
[477,478,479],[480,481,482],[483,484,485],
[486,487,488],[489,490,491],[492,493,494],
[495,496,497],[498,499,500],[501,502,503],
[504,505,506],[507,508,509],[510,511,512],
[513,514,515],[516,517,518],[519,520,521],
[522,523,524],[525,526,527],[528,529,530],
[531,532,533],[534,535,536],[537,538,539],
[540,541,542],[543,544,545],[546,547,548],
[549,550,551],[552,553,554],[555,556,557],
[558,559,560],[561,562,563],[564,565,566],
[567,568,569],[570,571,572],[573,574,575],
[576,577,578],[579,580,581],[582,583,584],
[585,586,587],[588,589,590],[591,592,593],
[594,595,596],[597,598,599],[600,601,602],
[603,604,605],[606,607,608],[609,610,611],
[612,613,614],[615,616,617],[618,619,620],
[621,622,623],[624,625,626],[627,628,629],
[630,631,632],[633,634,635],[636,637,638],
[639,640,641],[642,643,644],[645,646,647],
[648,649,650],[651,652,653],[654,655,656],
[657,658,659],[660,661,662],[663,664,665],
[666,667,668],[669,670,671],[672,673,674],
[675,676,677],[678,679,680],[681,682,683],
[684,685,686],[687,688,689],[690,691,692],
[693,694,695],[696,697,698],[699,700,701],
[702,703,704],[705,706,707],[708,709,710],
[711,712,713],[714,715,716],[717,718,719],
[720,721,722],[723,724,725],[726,727,728],
[729,730,731],[732,733,734],[735,736,737],
[738,739,740],[741,742,743],[744,745,746],
[747,748,749],[750,751,752],[753,754,755],
[756,757,758],[759,760,761],[762,763,764],
[765,766,767],[768,769,770],[771,772,773],
[774,775,776],[777,778,779],[780,781,782],
[783,784,785],[786,787,788],[789,790,791],
[792,793,794],[795,796,797],[798,799,800],
[801,802,803],[804,805,806],[807,808,809],
[810,811,812],[813,814,815],[816,817,818],
[819,820,821],[822,823,824],[825,826,827],
[828,829,830],[831,832,833],[834,835,836],
[837,838,839],[840,841,842],[843,844,845],
[846,847,848],[849,850,851],[852,853,854],
[855,856,857],[858,859,860],[861,862,863],
[864,865,866],[867,868,869],[870,871,872],
[873,874,875],[876,877,878],[879,880,881],
[882,883,884],[885,886,887],[888,889,890],
[891,892,893],[894,895,896],[897,898,899],
[900,901,902],[903,904,905],[906,907,908],
[909,910,911],[912,913,914],[915,916,917],
[918,919,920],[921,922,923],[924,925,926],
[927,928,929],[930,931,932],[933,934,935],
[936,937,938],[939,940,941],[942,943,944],
[945,946,947],[948,949,950],[951,952,953],
[954,955,956],[957,958,959],[960,961,962],
[963,964,965],[966,967,968],[969,970,971],
[972,973,974],[975,976,977],[978,979,980],
[981,982,983],[984,985,986],[987,988,989],
[990,991,992],[993,994,995],[996,997,998],
[999,1000,1001],[1002,1003,1004],[1005,1006,1007],
[1008,1009,1010],[1011,1012,1013],[1014,1015,1016],
[1017,1018,1019],[1020,1021,1022],[1023,1024,1025],
[1026,1027,1028],[1029,1030,1031],[1032,1033,1034],
[1035,1036,1037],[1038,1039,1040],[1041,1042,1043],
[1044,1045,1046],[1047,1048,1049],[1050,1051,1052],
[1053,1054,1055],[1056,1057,1058],[1059,1060,1061],
[1062,1063,1064],[1065,1066,1067],[1068,1069,1070],
[1071,1072,1073],[1074,1075,1076],[1077,1078,1079],
[1080,1081,1082],[1083,1084,1085],[1086,1087,1088],
[1089,1090,1091],[1092,1093,1094],[1095,1096,1097],
[1098,1099,1100],[1101,1102,1103],[1104,1105,1106],
[1107,1108,1109],[1110,1111,1112],[1113,1114,1115],
[1116,1117,1118],[1119,1120,1121],[1122,1123,1124],
[1125,1126,1127],[1128,1129,1130],[1131,1132,1133],
[1134,1135,1136],[1137,1138,1139],[1140,1141,1142],
[1143,1144,1145],[1146,1147,1148],[1149,1150,1151],
[1152,1153,1154],[1155,1156,1157],[1158,1159,1160],
[1161,1162,1163],[1164,1165,1166],[1167,1168,1169]]);}

function cliff_wave_L1Min() = [-213.101, -45.595, 0.000];
function cliff_wave_L1Max() = [213.104, 103.480, 10.000];

cliff_wave_L1(1);
